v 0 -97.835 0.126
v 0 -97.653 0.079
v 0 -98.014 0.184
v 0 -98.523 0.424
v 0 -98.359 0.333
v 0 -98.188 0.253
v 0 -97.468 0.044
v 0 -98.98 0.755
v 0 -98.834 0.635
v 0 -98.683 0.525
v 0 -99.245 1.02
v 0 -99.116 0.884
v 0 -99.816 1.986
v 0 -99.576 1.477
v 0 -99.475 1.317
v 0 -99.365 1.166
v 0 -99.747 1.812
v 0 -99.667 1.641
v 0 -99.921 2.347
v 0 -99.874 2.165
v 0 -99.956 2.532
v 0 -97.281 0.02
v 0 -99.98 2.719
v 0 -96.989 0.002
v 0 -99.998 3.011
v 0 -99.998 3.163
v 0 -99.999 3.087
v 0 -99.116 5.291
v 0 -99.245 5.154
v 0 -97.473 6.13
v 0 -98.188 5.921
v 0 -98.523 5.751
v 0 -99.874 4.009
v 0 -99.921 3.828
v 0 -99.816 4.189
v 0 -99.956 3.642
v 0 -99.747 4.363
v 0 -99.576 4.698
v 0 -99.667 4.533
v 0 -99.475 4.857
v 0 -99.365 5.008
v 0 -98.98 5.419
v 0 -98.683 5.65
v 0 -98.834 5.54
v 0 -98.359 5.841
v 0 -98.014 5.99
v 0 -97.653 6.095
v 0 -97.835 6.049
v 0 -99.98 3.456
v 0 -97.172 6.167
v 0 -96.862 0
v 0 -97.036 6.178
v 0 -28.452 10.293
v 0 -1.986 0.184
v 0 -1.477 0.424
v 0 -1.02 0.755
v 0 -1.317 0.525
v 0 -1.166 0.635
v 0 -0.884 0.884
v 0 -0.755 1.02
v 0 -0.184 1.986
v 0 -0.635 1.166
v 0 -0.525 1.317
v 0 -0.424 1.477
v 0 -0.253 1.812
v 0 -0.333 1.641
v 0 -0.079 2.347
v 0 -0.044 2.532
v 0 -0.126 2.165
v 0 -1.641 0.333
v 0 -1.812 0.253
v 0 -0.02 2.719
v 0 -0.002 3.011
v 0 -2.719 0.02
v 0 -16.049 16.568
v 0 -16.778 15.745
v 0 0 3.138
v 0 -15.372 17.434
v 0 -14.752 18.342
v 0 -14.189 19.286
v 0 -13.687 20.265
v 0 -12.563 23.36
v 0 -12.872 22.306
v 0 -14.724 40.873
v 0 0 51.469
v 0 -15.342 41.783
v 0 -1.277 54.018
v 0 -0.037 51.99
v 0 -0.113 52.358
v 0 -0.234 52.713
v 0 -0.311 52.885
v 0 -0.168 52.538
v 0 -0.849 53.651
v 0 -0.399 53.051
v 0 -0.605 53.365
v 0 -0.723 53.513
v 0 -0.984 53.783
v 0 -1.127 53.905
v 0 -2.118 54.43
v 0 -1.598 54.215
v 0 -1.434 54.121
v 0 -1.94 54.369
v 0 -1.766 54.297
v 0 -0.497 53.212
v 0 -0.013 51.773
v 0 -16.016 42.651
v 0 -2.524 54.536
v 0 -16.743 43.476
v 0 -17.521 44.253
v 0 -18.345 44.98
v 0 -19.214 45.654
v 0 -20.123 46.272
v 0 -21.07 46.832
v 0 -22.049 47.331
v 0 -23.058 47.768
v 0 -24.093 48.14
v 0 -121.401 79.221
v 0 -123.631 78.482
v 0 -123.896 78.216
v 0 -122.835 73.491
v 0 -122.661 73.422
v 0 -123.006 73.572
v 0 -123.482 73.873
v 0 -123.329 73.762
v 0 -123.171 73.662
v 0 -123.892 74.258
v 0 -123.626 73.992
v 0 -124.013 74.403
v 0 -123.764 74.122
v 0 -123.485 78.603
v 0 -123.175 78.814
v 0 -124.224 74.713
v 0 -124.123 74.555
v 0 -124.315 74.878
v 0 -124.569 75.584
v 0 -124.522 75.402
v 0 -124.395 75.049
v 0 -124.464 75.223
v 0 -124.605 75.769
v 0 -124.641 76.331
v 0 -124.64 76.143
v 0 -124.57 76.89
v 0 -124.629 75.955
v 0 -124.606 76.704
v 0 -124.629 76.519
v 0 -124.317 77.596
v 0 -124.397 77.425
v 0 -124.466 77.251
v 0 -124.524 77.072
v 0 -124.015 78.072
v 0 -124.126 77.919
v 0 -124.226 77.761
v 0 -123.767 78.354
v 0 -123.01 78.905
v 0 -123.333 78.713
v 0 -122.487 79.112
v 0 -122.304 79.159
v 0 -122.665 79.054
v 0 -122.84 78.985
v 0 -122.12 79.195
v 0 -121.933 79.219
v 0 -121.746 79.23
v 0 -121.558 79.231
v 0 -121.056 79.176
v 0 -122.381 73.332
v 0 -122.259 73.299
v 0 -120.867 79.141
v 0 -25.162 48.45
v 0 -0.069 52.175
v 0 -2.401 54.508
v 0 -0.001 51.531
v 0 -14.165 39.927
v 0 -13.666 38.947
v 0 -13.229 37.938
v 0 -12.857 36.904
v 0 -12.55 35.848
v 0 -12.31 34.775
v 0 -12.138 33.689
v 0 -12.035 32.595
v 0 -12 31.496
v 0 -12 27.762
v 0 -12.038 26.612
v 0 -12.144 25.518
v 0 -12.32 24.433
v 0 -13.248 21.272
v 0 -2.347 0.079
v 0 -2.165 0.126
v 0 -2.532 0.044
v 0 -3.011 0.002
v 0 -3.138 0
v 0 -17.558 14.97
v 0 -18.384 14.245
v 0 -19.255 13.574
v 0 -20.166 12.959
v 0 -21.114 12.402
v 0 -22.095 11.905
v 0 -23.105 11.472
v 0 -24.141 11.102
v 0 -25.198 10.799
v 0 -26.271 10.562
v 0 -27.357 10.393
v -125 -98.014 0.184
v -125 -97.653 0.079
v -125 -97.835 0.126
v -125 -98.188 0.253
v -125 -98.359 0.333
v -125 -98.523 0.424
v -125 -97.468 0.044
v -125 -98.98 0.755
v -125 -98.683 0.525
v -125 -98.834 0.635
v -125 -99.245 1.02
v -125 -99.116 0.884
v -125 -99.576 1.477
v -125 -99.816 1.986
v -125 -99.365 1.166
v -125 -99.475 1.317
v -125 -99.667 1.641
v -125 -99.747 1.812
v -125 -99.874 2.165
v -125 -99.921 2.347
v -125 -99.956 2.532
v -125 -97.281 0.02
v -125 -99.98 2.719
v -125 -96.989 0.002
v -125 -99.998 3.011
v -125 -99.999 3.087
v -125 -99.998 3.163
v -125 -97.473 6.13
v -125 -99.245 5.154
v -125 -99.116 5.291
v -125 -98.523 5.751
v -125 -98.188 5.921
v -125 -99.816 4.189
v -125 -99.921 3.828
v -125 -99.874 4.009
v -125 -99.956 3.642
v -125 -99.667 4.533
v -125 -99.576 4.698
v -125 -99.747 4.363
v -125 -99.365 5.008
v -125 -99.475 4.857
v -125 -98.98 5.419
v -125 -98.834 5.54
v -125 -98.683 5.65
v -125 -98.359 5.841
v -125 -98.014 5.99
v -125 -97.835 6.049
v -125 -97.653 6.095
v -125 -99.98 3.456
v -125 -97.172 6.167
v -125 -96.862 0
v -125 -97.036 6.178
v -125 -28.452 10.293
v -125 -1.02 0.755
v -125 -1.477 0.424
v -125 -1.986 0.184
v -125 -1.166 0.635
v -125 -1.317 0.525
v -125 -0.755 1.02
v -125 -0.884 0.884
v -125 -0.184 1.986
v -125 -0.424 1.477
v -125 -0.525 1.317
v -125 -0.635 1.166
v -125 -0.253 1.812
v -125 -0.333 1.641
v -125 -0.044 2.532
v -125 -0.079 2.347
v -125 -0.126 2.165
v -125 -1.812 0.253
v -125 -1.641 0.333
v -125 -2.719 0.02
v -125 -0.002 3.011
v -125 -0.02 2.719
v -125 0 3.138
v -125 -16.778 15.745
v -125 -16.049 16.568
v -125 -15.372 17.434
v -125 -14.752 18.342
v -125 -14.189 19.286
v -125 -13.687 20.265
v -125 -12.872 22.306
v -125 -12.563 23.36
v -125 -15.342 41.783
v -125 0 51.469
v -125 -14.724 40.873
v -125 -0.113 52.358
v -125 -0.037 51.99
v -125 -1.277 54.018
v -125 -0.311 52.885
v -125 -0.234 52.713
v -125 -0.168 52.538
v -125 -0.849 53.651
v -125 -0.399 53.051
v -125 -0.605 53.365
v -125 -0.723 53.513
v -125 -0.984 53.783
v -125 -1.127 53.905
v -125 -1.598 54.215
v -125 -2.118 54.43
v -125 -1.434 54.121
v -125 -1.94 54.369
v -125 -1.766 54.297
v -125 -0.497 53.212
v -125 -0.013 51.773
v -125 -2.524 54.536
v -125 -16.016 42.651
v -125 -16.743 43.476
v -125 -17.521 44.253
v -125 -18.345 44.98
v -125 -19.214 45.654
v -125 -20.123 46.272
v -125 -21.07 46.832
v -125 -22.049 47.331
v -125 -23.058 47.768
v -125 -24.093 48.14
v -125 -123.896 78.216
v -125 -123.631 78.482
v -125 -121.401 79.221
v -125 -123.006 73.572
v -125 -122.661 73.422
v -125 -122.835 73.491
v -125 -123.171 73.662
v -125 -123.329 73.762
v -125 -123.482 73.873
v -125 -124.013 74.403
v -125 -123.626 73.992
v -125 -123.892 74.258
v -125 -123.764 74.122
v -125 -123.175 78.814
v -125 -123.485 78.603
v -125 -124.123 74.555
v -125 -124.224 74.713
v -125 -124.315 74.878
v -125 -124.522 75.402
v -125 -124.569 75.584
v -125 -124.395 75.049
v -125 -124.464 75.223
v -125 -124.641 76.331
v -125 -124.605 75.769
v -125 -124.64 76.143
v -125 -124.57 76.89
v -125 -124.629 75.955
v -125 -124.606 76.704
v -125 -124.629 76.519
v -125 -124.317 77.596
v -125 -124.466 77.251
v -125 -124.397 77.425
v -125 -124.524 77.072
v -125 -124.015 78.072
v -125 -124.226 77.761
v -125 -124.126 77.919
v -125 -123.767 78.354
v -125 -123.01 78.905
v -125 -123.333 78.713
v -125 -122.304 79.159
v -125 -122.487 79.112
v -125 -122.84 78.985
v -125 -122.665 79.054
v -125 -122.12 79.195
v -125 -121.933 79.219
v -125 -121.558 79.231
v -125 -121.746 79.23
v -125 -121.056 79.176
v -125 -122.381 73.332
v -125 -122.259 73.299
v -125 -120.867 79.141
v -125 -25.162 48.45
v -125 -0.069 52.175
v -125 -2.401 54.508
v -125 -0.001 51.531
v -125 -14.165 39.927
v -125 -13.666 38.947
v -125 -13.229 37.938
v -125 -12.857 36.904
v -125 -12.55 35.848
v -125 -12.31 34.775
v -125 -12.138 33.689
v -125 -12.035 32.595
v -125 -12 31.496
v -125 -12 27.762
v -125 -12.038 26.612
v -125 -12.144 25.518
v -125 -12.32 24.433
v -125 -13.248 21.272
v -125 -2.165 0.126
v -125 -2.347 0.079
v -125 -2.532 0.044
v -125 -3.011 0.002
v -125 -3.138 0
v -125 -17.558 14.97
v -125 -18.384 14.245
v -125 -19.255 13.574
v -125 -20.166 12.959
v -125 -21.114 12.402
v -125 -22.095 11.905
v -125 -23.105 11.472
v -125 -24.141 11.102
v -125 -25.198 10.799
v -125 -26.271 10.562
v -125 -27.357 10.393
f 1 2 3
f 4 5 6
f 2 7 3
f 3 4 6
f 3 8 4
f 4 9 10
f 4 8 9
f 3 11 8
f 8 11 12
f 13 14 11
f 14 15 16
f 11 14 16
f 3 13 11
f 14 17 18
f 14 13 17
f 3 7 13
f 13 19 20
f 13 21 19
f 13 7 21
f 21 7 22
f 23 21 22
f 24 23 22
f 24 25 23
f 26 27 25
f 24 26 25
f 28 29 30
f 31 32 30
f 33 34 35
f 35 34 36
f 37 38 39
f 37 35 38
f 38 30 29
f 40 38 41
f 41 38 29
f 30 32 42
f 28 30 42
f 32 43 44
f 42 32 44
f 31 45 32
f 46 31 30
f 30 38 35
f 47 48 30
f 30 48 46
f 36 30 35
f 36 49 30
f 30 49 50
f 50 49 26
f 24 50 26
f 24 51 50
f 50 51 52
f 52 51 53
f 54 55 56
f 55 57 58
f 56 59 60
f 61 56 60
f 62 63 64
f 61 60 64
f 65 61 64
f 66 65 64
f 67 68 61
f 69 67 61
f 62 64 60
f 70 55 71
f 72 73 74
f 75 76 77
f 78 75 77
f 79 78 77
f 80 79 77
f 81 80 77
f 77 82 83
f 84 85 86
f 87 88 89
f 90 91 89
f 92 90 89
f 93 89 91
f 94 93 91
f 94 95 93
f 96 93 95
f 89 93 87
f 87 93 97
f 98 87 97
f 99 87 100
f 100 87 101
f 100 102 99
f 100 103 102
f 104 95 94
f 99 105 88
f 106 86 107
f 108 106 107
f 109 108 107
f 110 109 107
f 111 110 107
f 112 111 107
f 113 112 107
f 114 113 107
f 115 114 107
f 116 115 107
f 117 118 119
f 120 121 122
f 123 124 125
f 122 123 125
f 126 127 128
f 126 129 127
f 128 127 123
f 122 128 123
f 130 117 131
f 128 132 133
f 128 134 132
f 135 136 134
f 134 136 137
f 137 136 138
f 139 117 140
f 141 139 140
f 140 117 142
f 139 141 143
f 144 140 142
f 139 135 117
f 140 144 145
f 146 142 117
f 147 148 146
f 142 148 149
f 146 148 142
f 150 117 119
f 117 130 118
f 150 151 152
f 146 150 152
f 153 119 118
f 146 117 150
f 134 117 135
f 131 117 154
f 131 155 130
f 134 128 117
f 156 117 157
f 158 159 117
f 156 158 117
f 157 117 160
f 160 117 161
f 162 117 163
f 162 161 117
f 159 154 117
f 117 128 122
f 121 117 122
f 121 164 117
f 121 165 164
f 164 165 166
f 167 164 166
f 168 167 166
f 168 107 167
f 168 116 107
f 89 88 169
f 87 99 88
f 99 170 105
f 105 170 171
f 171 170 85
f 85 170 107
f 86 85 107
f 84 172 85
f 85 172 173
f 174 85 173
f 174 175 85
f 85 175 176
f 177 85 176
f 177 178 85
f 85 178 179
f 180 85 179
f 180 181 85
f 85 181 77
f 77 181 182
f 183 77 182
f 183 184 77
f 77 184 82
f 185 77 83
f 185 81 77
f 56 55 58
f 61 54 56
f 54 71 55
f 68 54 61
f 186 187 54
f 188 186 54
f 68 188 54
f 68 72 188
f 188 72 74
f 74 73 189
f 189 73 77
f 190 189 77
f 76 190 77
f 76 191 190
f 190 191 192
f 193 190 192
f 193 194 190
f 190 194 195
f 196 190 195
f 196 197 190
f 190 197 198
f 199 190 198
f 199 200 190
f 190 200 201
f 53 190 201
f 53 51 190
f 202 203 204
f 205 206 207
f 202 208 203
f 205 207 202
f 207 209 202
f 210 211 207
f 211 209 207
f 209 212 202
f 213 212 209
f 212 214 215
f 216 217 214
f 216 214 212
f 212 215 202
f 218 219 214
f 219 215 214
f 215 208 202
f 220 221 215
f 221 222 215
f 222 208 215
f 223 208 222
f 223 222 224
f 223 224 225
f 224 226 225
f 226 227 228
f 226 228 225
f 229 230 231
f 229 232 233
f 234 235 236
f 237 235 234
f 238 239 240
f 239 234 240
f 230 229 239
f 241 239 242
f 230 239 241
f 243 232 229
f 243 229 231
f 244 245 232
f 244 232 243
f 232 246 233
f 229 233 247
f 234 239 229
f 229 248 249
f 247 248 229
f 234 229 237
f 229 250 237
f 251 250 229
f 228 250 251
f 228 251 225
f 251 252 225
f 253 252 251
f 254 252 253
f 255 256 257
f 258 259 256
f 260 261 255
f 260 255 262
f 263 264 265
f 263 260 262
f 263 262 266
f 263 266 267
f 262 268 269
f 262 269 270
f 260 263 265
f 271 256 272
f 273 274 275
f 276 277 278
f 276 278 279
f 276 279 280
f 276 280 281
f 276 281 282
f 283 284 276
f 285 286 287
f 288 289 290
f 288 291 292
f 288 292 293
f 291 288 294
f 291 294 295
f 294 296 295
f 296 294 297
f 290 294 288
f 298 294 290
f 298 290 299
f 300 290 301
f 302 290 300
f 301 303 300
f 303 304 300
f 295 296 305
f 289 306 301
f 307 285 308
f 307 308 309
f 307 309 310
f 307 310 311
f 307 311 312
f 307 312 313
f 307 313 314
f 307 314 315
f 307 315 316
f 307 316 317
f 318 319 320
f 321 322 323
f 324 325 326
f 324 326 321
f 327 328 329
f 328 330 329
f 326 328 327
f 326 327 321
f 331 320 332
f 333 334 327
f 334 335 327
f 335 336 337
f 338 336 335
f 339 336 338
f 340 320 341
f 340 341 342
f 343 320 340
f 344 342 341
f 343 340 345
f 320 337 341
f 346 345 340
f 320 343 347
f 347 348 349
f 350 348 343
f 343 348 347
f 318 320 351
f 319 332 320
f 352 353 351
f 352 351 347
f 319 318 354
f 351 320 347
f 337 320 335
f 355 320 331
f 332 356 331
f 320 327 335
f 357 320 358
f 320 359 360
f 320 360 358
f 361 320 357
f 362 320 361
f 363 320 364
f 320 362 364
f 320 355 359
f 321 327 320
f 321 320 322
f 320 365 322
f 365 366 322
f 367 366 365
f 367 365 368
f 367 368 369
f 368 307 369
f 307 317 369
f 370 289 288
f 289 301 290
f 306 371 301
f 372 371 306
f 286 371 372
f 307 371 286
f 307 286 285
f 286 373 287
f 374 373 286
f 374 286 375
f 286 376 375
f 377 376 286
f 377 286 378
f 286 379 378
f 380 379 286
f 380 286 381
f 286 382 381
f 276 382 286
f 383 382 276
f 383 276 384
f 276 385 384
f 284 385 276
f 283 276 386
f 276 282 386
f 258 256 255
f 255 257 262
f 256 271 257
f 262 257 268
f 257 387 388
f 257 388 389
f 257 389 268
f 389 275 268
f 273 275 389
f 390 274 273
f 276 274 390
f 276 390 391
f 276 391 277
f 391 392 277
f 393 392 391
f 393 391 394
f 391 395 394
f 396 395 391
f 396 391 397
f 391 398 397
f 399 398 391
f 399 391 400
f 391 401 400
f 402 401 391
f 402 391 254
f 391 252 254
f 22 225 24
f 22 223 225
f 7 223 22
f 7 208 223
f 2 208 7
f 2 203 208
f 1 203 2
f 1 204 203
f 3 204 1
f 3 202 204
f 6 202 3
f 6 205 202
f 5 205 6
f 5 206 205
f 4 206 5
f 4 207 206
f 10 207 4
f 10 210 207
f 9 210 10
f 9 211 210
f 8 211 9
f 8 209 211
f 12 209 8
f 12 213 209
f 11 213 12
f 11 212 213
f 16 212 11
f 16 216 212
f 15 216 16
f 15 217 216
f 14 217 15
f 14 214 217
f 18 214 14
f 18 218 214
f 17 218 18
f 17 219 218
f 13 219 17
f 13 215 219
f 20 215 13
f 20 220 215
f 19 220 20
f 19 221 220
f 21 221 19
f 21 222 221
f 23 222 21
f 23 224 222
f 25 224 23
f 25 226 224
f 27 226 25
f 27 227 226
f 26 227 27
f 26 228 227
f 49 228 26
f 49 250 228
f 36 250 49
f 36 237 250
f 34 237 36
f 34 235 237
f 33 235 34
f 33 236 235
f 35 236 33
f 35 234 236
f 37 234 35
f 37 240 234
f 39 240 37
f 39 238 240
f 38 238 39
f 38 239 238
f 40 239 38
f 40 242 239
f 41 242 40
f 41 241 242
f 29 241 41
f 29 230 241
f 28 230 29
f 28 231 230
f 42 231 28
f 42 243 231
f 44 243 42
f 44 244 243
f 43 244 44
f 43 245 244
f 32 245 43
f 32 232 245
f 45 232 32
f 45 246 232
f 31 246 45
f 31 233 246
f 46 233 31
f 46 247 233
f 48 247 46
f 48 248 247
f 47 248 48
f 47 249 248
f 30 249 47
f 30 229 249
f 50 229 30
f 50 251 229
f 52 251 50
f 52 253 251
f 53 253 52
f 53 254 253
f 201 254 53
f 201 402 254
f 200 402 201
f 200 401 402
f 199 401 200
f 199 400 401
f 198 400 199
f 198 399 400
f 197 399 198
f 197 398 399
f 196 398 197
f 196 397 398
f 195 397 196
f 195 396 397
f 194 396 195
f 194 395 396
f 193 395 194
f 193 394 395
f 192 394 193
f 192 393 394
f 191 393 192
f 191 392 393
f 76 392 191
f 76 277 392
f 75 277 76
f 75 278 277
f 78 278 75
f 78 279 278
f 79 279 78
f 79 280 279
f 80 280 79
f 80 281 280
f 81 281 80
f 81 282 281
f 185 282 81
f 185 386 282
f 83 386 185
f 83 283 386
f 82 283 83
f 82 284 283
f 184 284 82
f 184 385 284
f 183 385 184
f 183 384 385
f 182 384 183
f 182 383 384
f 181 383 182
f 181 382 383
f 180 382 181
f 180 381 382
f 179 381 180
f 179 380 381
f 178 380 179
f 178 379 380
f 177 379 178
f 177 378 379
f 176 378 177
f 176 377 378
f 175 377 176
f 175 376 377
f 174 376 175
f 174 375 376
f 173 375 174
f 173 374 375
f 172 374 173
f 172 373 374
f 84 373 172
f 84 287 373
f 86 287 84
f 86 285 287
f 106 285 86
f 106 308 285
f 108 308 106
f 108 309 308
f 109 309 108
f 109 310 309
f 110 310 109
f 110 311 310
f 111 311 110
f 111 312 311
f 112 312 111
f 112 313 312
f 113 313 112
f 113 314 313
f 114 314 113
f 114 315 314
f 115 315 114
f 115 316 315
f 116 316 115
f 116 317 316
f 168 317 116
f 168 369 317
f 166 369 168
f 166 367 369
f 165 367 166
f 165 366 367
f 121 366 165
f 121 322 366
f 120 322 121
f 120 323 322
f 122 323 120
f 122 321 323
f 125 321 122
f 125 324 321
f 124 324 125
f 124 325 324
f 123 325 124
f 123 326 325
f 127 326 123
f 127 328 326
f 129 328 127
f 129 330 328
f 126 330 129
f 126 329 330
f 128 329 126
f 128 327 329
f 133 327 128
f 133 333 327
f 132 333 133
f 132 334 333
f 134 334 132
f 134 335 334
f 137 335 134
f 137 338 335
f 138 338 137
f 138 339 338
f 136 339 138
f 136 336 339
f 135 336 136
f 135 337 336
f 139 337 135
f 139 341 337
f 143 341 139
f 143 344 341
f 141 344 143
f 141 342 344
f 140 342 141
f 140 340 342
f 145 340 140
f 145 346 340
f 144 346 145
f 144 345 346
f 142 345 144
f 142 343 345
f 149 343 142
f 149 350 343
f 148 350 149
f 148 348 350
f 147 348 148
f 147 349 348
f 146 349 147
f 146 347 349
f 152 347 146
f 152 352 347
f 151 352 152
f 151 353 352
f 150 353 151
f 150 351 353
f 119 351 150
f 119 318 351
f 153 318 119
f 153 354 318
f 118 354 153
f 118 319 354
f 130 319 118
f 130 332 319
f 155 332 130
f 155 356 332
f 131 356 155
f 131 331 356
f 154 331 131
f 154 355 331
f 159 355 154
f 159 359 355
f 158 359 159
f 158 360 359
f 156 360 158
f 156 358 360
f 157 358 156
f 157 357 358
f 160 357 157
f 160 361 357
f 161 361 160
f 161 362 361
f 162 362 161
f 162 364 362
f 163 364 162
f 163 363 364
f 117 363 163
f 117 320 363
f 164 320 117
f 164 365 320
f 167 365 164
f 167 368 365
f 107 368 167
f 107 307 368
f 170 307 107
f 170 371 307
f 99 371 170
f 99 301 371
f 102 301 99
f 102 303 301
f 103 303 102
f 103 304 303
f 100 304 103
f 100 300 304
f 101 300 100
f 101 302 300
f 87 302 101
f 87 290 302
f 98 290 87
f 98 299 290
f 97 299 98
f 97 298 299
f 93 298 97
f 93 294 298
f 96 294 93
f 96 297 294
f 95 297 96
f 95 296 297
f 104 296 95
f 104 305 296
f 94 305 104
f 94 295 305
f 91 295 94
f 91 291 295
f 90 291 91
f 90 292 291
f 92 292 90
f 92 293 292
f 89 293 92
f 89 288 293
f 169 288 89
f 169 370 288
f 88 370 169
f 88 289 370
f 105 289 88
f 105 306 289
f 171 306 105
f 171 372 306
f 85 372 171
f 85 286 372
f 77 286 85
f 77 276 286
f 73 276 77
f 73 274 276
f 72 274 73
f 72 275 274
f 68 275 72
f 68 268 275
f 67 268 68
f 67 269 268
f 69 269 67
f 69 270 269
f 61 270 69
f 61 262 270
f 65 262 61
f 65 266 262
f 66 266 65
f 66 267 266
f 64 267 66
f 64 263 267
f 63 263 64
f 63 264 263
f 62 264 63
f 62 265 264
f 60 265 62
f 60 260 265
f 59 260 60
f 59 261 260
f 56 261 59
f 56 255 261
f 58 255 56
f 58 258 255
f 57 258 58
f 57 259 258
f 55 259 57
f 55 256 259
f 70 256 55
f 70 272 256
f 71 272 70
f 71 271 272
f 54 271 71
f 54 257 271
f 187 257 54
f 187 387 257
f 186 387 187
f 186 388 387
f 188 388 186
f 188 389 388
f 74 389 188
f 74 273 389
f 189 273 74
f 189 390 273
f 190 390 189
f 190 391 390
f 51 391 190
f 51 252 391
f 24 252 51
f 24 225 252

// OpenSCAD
// file: params_template_small.scad
// Settings file for wavetable_desktop_speaker_stand.scad
// Model: Template
// Year created: 2022

// ASCII diagram of most dimensions:
//
//                    |
//                    |<-._  angle
//                    |    \
//                    |     |      top_depth   ___________---------->/
//                    |    _v________----------                     /
//              /<---------                                        /
//             /                                     ___________   _____
//            /                  __________----------           )    ^
//       \   __________----------                               /    |
//      /   /                                                  /     |
//   width /                                     ___________  /      |
//    /   /                  __________----------       ____)/       |
//   \   /__________----------               ______------            |
//       /                    _______--------                        |
//      |       ______-------                                     height
//      |      /   \__________                                       |
//      |     /    /          -----------____________                |
//      |    (    /                                  )               |
//      |     \  /                                   /               |
//      |      \/__________                         /                |
//      |                  ----------____________  /                 |
//       \_______________________________________)/                __v__
//
//      |                                         |
//      |                                         |
//      |<--------------bottom depth------------->|
//

// thickness is best thought of as overall 'chunkiness.'
// technically the minimum thickness of the back and thickness of top and bottom where they meet the back.
// The leading edges of the top and bottom will taper out to about 1/2 of the thickness.
thickness = 12;

// width of the stand.
width = 125;

//height from flat surface to front edge:
height = 80;

// top_depth is measured along the top surface of the stand, it should be similar to the depth of your speaker.
top_depth = 125;

// The bottom platform can be shorter than the top, values from 0.8 to 1.0 work well with larger values being more stable.
bottom_depth = 0.8*top_depth;

// tilt back angle of the top surface. Depending on thickness, infill percent, speaker weight, the stand could bend a little.
// recommended value is < 12 degrees
angle = 12;

// Include a lip at the back to prevent the speaker from sliding backwards.
// lip dimensions are derived from `thickness`
// the stop is in addition to the speaker depth so no changes to `top_depth` should be required.
include_stop = false;
// adjustable height, but must be at least 1/2 the thickness because of the half round that is added.
stop_height = 6;
// main file
// To customize this model, it is reccomended to create a copy of the params_template.scad file.
include <params_template_small.scad>
// include <params_template_small_with_backstop.scad>
// include <params_template_large.scad>

finalize();

$fn=100;

// Calculated values, not recommended to change.
tapered_thickness = thickness / 2;
back_height = height - top_depth * sin(angle);
in_round = (back_height + 2 * thickness * (sin(angle) - 1)) / 2;
out_round = tapered_thickness / 2;
// Stop height moved to params file:
// stop_height = thickness / 2;

// For debug, access to each submodule:
// backstop();
// form();
// profile();
// base();
// back();
// top();


module finalize(){
    // This module gets the final elements of the stand including
    // adding the backstop if set to true. This module should be
    // called to create the complete model.

    rotate([90, 0, -90])
    translate([0,0,width/2])

    if (include_stop){
        union(){
            speaker_stand();
            backstop();
        }
    }
    else{
        speaker_stand();
    }
}
module backstop(){

    // This module creates the backstop which is optionally added to the stand.
    // It also adds a concavity to the backside which serves to balance the
    // addtional thickness caused by adding the backstop.

    // Crucial coordinates of the new back for calculating the backstop concavity
    Ax = (stop_height - out_round) * sin(angle) + 2 * out_round * cos(angle);
    Ay = (stop_height - out_round) * cos(angle) + back_height - 2 * out_round * sin(angle);
    Bx = 0;
    By = out_round;

    // We need to determine a circle such that the new (flat) rear edge of the backstop creates
    // a chord of the circle that will carve out the concave back.

    // Determine the chord length (equal to back length) and angle (equal to back angle):
    chord_length = sqrt((Ax - Bx) ^ 2 + (Ay - By) ^ 2);
    back_angle = asin((Ay - By)/chord_length);

    // From these two parameters we can calculate the correct radius with trig.
    rear_concavity_radius = chord_length / 2 / sin (90 - back_angle);
    echo(rear_concavity_radius);

    rotate([0,180, 0])
    linear_extrude(width, center=true){
        union(){
            difference(){
                union(){
                    // build main body of what will become the backstop,
                    // this must extend into the existing profile to cover the rounding there.
                    polygon(points=[
                        [Bx, By],
                        [Bx - thickness, By],
                        [Bx - thickness, back_height + thickness * sin(angle)],
                        [0, back_height],
                        [(stop_height - out_round)*sin(angle), (stop_height - out_round) * cos(angle) + back_height],
                        [Ax, Ay],
                        ]
                    );
                    // add small interior corner radius to soften transition into the backstop.
                    transition_radius = 0.5;
                    // 0.003 is a hacky fix due to a gap that opens at some tilt angles
                    translate([0, back_height-0.003])
                    rotate([0,0,-90 - angle])
                    translate([-transition_radius, -transition_radius])
                    difference(){
                        square(transition_radius);
                        circle(r=transition_radius);
                    }
                }
                // carve out the rear concavity.
                translate([rear_concavity_radius, out_round])
                circle(r=rear_concavity_radius, $fn=500);
            }
            // add circle to top of backstop to create round edge.
            translate([(stop_height - out_round)*sin(angle) + out_round * cos(angle), (stop_height - out_round) * cos(angle) + back_height - out_round * sin(angle)])
            circle(r=out_round);
        }
    }
}

module speaker_stand(){
    // This module extrudes the profile() to create the
    // solid model of the stand excludin the backstop.
    linear_extrude(width, center = true)
    profile();
}

module profile(){
    // This module composes the polygons from base(), back() and top() and
    // adds the concave and convex rounding except in the backstop.

    // form concave corners
    offset(r=-in_round, chamfer=true)
    offset(r=in_round, chamfer=true)

    // form convex corners
    offset(r=out_round, chamfer=true)
    offset(r=-out_round, chamfer=true)
    union(){
        back();
        top();
        base();
    }
}

module base(){
    // This module draws the basic shape of the base,
    // tapering to 1/2 the thickness.
    polygon(points=[
            [0,0],
            [0, thickness],
            [bottom_depth, tapered_thickness],
            [bottom_depth, 0]
        ]
    );
}

module back(){
    // This module draws the basic shape of the back
    square([thickness, back_height]);
}

module top(){
    // This module draws the basic shape of the top angled back
    // by the defined angle, and tapering to 1/2 the thickness.
    rise_from_angle = top_depth * sin(angle);
    translate([0, back_height-thickness])
    polygon(points=[
            [0,0],
            [0, thickness],
            [top_depth, thickness + rise_from_angle],
            [top_depth, thickness - tapered_thickness + rise_from_angle]
        ]
    );
}
